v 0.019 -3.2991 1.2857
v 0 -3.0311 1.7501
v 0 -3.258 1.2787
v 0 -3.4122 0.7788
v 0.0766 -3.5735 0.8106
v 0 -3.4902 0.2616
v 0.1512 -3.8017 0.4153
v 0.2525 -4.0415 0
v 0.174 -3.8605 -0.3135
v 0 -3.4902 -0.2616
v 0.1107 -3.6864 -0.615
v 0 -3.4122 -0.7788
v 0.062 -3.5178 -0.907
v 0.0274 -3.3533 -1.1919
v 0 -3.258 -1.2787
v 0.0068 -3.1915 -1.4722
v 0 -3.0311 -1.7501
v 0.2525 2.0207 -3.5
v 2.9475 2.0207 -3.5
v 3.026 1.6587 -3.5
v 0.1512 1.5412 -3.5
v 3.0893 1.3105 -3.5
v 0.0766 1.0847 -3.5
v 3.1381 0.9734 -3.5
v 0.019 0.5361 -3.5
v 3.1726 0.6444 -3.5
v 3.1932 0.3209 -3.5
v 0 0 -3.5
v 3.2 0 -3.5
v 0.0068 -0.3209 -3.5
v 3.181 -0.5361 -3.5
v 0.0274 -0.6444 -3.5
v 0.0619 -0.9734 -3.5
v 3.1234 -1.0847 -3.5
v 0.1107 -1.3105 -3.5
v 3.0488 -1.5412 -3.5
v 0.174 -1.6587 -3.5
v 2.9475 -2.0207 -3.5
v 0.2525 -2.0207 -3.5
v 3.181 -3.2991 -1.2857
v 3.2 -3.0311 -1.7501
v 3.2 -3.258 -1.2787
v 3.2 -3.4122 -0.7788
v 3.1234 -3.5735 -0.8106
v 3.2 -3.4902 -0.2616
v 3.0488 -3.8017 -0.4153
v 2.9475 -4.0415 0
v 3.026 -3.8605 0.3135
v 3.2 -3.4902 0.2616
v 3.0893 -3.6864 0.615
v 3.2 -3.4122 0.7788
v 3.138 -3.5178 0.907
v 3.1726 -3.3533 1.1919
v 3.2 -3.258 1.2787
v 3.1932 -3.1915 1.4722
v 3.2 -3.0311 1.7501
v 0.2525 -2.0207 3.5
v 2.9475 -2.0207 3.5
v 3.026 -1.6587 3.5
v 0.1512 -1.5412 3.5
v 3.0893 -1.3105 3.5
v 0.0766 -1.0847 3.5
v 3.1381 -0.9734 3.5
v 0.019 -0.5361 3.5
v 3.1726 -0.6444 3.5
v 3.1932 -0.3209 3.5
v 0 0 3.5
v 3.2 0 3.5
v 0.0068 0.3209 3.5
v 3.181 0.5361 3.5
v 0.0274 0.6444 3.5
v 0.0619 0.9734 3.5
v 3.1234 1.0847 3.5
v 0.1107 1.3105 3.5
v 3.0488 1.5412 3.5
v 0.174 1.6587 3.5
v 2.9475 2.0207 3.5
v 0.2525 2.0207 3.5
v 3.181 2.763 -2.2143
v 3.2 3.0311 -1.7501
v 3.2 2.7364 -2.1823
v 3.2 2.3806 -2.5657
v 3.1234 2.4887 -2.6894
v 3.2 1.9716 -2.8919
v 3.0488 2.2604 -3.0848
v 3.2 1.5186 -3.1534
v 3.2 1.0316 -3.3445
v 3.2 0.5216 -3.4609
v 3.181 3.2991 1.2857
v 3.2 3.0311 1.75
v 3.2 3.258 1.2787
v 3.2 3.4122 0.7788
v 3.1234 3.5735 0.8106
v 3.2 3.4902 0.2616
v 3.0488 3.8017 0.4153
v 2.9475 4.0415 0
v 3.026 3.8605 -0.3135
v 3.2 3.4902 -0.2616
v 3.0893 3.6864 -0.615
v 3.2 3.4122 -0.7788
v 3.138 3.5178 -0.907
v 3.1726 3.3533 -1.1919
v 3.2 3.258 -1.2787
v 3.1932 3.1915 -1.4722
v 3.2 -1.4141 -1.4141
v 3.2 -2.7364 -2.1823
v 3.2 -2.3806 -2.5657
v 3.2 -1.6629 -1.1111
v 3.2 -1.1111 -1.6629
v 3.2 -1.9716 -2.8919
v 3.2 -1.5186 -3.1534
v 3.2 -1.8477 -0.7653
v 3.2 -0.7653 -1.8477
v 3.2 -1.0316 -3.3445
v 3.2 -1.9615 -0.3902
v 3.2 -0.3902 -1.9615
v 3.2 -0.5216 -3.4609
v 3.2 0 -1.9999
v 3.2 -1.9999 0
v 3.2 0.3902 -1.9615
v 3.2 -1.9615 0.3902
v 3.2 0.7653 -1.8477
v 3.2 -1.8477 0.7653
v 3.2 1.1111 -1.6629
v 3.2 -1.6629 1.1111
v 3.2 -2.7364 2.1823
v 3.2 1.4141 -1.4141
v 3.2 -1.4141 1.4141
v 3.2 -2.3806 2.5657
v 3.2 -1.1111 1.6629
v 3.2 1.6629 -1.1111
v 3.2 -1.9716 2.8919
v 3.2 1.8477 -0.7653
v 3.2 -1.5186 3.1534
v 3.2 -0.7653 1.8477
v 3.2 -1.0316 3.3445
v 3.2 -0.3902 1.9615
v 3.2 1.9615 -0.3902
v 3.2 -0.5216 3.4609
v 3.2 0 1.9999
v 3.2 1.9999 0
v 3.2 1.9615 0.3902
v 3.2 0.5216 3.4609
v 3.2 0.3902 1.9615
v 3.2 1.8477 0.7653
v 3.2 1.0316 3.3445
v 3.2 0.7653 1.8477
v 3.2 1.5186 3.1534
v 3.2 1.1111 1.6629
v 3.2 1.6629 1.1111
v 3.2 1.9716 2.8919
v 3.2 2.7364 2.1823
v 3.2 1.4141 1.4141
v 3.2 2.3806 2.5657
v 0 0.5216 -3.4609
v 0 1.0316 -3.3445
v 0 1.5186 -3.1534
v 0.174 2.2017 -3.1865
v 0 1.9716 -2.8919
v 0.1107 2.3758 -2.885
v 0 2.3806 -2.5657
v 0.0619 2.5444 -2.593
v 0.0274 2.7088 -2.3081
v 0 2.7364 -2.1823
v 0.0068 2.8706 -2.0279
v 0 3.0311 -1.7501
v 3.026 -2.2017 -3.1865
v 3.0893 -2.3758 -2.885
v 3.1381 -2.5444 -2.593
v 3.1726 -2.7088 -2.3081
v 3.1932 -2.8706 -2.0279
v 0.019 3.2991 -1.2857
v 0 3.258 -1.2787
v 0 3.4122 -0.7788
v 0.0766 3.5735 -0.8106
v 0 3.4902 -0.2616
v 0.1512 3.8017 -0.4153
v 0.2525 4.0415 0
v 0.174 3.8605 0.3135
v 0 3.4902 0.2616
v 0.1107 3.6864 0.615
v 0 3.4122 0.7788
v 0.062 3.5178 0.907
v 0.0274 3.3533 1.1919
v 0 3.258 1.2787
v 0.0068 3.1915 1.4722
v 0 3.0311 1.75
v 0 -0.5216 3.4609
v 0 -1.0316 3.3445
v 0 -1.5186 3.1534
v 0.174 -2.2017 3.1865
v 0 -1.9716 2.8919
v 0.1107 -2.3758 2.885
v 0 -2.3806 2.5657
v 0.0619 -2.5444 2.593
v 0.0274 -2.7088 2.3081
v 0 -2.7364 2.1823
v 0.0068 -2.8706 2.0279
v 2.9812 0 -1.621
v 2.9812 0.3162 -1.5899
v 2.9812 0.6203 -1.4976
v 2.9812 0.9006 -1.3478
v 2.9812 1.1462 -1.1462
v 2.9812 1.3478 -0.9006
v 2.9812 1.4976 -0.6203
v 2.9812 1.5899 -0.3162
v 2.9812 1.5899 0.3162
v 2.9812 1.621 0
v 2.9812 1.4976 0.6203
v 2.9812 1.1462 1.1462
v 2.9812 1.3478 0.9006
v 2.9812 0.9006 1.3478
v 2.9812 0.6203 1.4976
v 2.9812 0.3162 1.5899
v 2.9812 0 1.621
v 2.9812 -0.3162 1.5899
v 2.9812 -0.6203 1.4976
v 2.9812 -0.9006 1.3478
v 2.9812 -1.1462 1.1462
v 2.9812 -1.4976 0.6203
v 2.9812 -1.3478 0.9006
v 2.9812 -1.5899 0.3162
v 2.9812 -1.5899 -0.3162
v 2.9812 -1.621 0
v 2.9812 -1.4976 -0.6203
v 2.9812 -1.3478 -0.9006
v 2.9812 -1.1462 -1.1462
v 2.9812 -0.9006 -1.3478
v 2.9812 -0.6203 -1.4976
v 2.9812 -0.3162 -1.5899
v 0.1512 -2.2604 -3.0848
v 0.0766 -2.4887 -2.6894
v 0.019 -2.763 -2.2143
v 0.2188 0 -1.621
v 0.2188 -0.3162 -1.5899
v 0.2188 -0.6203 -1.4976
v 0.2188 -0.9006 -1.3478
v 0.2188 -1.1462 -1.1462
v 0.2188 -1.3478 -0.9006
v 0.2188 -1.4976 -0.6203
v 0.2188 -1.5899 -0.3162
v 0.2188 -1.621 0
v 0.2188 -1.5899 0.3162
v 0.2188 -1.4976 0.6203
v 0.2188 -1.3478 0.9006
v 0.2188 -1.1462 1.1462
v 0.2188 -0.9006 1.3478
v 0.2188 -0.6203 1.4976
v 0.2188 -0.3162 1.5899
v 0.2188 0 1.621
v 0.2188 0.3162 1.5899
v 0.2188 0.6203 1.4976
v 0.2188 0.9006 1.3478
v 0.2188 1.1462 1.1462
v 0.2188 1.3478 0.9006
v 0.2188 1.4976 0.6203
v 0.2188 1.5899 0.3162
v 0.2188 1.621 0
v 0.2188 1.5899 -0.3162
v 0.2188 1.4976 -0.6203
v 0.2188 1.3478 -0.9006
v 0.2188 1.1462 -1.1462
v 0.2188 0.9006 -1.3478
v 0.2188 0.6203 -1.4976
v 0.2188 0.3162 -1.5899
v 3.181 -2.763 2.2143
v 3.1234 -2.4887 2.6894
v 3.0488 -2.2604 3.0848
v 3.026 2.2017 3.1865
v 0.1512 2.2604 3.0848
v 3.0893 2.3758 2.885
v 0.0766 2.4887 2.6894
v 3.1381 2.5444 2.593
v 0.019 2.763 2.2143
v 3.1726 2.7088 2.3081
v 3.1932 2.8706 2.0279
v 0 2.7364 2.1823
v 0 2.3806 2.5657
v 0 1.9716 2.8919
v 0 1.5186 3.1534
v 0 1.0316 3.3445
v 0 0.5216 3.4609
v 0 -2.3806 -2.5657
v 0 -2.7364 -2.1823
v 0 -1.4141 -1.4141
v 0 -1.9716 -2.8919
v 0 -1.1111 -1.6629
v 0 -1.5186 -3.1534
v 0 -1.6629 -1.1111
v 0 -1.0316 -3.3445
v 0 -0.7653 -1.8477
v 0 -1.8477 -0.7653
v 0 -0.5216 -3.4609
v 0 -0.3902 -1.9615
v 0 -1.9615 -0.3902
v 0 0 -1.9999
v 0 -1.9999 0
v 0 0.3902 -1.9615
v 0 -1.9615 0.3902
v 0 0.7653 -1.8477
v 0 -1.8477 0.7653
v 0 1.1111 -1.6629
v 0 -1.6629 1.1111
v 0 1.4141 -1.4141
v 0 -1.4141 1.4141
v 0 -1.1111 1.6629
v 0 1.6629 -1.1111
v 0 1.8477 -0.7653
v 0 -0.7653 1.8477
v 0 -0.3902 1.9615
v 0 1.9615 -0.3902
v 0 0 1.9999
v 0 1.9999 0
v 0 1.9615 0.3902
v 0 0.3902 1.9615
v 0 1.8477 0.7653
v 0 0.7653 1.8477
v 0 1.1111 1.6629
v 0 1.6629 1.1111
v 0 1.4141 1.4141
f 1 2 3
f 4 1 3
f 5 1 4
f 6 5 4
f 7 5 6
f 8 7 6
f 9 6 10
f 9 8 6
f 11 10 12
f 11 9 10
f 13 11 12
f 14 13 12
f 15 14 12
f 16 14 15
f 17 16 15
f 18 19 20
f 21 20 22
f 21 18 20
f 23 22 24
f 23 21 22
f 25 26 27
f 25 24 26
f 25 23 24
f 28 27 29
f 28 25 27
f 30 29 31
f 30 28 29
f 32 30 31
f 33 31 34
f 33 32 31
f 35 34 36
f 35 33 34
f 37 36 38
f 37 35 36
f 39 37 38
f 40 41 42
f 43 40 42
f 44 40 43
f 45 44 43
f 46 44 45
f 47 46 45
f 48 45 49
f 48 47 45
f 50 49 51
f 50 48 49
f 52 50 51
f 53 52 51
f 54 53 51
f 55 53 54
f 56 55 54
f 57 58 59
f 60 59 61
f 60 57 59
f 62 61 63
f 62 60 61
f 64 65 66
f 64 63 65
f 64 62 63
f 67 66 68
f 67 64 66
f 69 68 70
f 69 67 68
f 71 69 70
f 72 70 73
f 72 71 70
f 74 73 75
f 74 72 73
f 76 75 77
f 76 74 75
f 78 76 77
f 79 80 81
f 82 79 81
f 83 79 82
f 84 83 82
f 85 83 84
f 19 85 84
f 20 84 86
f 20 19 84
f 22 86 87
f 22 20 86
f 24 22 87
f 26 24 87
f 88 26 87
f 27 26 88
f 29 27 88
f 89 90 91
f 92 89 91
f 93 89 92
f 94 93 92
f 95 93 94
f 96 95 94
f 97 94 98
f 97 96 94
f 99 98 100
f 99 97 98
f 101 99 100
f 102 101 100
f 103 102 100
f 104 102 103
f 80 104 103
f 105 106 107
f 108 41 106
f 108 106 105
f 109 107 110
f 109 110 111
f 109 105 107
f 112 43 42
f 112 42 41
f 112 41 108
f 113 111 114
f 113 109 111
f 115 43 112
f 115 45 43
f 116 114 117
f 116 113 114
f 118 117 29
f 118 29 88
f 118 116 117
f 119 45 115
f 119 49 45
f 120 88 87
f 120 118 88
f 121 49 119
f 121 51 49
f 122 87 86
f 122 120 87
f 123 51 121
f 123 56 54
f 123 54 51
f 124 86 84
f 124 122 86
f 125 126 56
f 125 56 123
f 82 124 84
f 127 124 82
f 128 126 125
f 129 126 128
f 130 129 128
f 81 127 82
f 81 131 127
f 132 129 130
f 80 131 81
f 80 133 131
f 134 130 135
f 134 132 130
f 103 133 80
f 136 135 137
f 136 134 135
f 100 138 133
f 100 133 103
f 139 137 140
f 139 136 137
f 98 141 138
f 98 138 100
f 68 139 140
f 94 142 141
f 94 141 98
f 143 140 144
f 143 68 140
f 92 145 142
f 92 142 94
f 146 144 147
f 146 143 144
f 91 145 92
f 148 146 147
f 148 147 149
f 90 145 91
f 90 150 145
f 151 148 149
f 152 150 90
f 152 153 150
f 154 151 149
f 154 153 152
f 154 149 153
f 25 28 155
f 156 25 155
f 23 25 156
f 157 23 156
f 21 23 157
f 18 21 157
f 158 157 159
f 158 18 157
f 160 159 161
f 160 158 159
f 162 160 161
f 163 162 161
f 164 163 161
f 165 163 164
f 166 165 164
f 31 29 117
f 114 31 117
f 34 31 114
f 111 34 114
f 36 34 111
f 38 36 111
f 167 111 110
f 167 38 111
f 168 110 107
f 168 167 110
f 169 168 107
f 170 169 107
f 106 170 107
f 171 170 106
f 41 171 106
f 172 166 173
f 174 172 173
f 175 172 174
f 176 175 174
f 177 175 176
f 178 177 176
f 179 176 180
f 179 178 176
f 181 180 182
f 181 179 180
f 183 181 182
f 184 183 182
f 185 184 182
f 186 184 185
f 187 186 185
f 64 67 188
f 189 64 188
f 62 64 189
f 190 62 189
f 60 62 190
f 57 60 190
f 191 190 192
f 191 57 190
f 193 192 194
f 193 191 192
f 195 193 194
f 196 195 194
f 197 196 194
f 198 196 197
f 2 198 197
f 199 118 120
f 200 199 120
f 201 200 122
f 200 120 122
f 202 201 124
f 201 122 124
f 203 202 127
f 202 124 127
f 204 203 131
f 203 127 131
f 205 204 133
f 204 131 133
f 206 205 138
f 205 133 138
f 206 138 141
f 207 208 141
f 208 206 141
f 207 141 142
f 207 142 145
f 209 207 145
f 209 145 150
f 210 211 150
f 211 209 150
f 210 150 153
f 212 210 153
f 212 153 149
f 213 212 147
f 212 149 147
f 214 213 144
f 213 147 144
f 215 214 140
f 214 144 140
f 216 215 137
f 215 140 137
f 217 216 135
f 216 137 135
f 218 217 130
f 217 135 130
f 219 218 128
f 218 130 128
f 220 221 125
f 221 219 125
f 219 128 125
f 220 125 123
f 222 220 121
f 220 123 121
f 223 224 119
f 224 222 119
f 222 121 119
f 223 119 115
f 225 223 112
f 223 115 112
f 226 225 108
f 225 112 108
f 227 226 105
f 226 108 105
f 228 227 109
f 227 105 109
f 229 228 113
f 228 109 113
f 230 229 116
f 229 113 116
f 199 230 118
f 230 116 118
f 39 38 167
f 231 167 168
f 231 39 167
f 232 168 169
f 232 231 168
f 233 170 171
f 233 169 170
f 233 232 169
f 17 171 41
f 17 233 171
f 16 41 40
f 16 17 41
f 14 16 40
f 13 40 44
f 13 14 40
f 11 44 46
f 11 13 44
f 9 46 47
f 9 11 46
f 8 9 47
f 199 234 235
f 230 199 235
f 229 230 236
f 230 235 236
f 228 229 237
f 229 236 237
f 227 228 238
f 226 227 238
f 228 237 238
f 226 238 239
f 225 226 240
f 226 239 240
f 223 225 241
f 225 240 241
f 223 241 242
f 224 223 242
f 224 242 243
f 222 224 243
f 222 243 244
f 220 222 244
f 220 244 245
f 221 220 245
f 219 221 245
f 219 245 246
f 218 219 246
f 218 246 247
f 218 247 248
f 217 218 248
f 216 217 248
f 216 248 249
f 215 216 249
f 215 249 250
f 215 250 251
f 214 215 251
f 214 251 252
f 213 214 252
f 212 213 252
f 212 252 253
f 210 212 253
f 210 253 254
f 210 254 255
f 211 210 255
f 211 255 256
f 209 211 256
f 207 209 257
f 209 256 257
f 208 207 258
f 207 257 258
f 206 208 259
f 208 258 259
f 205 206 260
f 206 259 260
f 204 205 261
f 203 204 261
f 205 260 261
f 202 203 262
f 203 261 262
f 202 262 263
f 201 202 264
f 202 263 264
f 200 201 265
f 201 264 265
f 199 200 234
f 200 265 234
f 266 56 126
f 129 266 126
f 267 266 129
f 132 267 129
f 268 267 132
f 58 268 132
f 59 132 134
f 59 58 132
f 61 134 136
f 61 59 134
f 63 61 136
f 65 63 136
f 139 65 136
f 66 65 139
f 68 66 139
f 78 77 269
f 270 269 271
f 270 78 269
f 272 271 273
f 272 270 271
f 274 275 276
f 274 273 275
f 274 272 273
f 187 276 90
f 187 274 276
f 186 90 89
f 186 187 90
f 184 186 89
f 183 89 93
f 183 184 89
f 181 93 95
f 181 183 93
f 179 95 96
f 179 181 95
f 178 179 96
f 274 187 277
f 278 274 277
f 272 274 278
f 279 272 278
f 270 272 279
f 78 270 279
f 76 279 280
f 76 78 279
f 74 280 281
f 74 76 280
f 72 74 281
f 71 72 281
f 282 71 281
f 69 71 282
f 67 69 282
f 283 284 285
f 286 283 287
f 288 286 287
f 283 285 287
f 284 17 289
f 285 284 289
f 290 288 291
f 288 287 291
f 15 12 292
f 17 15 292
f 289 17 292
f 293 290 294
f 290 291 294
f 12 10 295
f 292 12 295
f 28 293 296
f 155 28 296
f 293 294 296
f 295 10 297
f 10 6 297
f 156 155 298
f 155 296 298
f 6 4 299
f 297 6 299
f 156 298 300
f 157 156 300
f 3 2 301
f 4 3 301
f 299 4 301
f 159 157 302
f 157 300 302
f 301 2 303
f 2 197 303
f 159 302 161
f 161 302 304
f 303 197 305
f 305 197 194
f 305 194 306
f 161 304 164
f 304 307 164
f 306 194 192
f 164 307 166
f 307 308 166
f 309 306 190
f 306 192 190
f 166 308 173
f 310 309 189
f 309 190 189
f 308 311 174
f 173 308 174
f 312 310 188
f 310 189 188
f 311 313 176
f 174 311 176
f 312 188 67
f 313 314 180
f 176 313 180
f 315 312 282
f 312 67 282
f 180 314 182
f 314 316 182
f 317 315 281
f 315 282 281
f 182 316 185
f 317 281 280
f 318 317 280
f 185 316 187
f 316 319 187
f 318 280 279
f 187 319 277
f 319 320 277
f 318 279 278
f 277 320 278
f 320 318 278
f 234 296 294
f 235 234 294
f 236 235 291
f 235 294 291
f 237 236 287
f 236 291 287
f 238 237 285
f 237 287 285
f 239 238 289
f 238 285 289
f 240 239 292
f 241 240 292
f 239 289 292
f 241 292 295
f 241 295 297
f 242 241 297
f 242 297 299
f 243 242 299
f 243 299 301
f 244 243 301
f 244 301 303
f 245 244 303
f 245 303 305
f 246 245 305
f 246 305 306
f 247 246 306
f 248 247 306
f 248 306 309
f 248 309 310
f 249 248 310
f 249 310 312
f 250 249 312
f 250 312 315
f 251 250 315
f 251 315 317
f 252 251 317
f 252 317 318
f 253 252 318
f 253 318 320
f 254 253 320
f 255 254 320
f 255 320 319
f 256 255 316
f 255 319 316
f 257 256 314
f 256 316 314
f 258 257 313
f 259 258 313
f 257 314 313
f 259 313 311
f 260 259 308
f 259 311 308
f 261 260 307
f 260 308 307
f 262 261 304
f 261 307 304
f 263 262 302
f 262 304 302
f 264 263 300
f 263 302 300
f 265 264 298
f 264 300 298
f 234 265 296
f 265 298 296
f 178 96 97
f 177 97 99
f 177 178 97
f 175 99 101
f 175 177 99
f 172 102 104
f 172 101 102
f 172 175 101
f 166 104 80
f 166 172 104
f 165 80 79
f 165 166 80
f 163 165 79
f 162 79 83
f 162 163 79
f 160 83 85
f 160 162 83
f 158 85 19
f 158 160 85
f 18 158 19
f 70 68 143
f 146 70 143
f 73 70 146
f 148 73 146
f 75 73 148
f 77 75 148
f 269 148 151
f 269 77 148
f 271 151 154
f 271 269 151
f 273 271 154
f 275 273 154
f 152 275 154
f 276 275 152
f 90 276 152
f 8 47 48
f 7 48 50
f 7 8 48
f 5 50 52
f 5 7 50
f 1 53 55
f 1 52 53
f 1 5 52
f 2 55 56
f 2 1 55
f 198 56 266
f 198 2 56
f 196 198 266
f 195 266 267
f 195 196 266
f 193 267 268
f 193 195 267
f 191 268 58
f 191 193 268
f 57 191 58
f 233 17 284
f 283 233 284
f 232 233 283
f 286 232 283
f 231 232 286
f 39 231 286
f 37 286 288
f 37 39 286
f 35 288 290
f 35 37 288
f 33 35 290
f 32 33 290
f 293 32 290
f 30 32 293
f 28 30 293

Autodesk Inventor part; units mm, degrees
ref_plane "YZ Plane" through (0, 0, 0) normal (1, 0, 0) x (0, 1, 0)
ref_plane "XZ Plane" through (0, 0, 0) normal (0, 1, 0) x (-1, 0, 0)
sketch "Sketch1" plane through (0, 0, 0) normal (1, 0, 0) x (0, 1, 0)
  line L0 (-4.0415, 0) -> (-2.0207, 3.5)
  line L1 (-2.0207, 3.5) -> (2.0207, 3.5)
  line L2 (2.0207, 3.5) -> (4.0415, 0)
  line L3 (4.0415, 0) -> (2.0207, -3.5)
  line L4 (2.0207, -3.5) -> (-2.0207, -3.5)
  line L5 (-2.0207, -3.5) -> (-4.0415, 0)
  point P0 (0, 0)
  point P1 (0, 0)
  dimension "d0" = 8.0829
extrude "Body" add sketch "Sketch1" along normal blind 3.2
sketch "Sketch2" plane through (0, 0, 0) normal (0, 0, 1) x (1, 0, 0)
  line L0 (0, 2.0207) -> (0, 4.0415) projected
  line L1 (0, 4.0415) -> (3.2, 4.0415) projected
  line L2 (3.2, 2.0207) -> (3.2, 4.0415) projected
  line L3 (-0.64, 0) -> (3.84, 0) projected
  line L4 (0.2525, 4.0415) -> (0, 3.5)
  line L5 (2.9475, 4.0415) -> (3.2, 3.5)
  dimension "d3" = 25
  dimension "d4" = 25
  dimension "d5" = 7
  dimension "d6" = 7
revolve "Chamfer1" cut sketch "Sketch2" angle 360 about axis through (-10, 0, 0) along (1, 0, 0)
sketch "Sketch3" plane through (3.2, 0, 0) normal (1, 0, 0) x (0, 0, -1)
  arc A0 (-1.75, -3.0311) -> (1.75, -3.0311) centre (0, 0) ccw projected
hole "Thread" at (3.2, 0, 0) direction (-1, 0, 0) diameter 3.242 end through all thread size "M4x0.7" class "6H" standard "ANSI Metric M Profile"
chamfer "Chamfer2" distance 0.3789 angle 30 1 edges at (3.2, 0, 1.621) measured on face at (3.2, 2.8569, -0.0651)
chamfer "Chamfer3" distance 0.3789 angle 30 1 edges at (0, 0, 1.621) measured on face at (0, 2.8569, -0.0651)
ref_plane "Work Plane1" through (-7.9612, 0, 0) normal (0, -0.866, -0.5) x (1, 0, 0)
equation "\"d0\" = 1.1547 * SW"
equation "\"d1\" = KOH"
equation "\"d8\" = -0.5 * GD1 + 0.5 * NND"
equation "\"d40\" = -0.5 * GD1 + 0.5 * NND"
equation "\"d10\" = -0.5 * GD1 + 0.5 * NND"
equation "\"d41\" = -0.5 * GD1 + 0.5 * NND"
equation "\"d3\" = ANG1"
equation "\"d4\" = ANG2"
equation "\"d5\" = SW0"
equation "\"d6\" = SW01"
equation "\"ANG1\" = 25deg"
equation "\"ANG2\" = 25deg"
equation "\"NND\" = 4"
equation "\"KOH\" = 3.2"
equation "\"SW\" = 7"
equation "\"SW0\" = SW"
equation "\"SW01\" = SW"
equation "\"GUL\" = 0.541266 * PTC"
equation "\"THREADDIA\" = 4"
equation "\"TOA\" = 30deg"
equation "\"PTC\" = 0.7"
equation "\"E0\" = 1.155 * SW"
equation "\"GAL\" = 0.541266 * PTC"
equation "\"SD2\" = 0"
equation "\"WFT\" = 0"
equation "\"GD1\" = 3.242228"
properties part number "ANSI B 18.2.4.1 M - M4 x 0.7" material "Steel, Mild"
